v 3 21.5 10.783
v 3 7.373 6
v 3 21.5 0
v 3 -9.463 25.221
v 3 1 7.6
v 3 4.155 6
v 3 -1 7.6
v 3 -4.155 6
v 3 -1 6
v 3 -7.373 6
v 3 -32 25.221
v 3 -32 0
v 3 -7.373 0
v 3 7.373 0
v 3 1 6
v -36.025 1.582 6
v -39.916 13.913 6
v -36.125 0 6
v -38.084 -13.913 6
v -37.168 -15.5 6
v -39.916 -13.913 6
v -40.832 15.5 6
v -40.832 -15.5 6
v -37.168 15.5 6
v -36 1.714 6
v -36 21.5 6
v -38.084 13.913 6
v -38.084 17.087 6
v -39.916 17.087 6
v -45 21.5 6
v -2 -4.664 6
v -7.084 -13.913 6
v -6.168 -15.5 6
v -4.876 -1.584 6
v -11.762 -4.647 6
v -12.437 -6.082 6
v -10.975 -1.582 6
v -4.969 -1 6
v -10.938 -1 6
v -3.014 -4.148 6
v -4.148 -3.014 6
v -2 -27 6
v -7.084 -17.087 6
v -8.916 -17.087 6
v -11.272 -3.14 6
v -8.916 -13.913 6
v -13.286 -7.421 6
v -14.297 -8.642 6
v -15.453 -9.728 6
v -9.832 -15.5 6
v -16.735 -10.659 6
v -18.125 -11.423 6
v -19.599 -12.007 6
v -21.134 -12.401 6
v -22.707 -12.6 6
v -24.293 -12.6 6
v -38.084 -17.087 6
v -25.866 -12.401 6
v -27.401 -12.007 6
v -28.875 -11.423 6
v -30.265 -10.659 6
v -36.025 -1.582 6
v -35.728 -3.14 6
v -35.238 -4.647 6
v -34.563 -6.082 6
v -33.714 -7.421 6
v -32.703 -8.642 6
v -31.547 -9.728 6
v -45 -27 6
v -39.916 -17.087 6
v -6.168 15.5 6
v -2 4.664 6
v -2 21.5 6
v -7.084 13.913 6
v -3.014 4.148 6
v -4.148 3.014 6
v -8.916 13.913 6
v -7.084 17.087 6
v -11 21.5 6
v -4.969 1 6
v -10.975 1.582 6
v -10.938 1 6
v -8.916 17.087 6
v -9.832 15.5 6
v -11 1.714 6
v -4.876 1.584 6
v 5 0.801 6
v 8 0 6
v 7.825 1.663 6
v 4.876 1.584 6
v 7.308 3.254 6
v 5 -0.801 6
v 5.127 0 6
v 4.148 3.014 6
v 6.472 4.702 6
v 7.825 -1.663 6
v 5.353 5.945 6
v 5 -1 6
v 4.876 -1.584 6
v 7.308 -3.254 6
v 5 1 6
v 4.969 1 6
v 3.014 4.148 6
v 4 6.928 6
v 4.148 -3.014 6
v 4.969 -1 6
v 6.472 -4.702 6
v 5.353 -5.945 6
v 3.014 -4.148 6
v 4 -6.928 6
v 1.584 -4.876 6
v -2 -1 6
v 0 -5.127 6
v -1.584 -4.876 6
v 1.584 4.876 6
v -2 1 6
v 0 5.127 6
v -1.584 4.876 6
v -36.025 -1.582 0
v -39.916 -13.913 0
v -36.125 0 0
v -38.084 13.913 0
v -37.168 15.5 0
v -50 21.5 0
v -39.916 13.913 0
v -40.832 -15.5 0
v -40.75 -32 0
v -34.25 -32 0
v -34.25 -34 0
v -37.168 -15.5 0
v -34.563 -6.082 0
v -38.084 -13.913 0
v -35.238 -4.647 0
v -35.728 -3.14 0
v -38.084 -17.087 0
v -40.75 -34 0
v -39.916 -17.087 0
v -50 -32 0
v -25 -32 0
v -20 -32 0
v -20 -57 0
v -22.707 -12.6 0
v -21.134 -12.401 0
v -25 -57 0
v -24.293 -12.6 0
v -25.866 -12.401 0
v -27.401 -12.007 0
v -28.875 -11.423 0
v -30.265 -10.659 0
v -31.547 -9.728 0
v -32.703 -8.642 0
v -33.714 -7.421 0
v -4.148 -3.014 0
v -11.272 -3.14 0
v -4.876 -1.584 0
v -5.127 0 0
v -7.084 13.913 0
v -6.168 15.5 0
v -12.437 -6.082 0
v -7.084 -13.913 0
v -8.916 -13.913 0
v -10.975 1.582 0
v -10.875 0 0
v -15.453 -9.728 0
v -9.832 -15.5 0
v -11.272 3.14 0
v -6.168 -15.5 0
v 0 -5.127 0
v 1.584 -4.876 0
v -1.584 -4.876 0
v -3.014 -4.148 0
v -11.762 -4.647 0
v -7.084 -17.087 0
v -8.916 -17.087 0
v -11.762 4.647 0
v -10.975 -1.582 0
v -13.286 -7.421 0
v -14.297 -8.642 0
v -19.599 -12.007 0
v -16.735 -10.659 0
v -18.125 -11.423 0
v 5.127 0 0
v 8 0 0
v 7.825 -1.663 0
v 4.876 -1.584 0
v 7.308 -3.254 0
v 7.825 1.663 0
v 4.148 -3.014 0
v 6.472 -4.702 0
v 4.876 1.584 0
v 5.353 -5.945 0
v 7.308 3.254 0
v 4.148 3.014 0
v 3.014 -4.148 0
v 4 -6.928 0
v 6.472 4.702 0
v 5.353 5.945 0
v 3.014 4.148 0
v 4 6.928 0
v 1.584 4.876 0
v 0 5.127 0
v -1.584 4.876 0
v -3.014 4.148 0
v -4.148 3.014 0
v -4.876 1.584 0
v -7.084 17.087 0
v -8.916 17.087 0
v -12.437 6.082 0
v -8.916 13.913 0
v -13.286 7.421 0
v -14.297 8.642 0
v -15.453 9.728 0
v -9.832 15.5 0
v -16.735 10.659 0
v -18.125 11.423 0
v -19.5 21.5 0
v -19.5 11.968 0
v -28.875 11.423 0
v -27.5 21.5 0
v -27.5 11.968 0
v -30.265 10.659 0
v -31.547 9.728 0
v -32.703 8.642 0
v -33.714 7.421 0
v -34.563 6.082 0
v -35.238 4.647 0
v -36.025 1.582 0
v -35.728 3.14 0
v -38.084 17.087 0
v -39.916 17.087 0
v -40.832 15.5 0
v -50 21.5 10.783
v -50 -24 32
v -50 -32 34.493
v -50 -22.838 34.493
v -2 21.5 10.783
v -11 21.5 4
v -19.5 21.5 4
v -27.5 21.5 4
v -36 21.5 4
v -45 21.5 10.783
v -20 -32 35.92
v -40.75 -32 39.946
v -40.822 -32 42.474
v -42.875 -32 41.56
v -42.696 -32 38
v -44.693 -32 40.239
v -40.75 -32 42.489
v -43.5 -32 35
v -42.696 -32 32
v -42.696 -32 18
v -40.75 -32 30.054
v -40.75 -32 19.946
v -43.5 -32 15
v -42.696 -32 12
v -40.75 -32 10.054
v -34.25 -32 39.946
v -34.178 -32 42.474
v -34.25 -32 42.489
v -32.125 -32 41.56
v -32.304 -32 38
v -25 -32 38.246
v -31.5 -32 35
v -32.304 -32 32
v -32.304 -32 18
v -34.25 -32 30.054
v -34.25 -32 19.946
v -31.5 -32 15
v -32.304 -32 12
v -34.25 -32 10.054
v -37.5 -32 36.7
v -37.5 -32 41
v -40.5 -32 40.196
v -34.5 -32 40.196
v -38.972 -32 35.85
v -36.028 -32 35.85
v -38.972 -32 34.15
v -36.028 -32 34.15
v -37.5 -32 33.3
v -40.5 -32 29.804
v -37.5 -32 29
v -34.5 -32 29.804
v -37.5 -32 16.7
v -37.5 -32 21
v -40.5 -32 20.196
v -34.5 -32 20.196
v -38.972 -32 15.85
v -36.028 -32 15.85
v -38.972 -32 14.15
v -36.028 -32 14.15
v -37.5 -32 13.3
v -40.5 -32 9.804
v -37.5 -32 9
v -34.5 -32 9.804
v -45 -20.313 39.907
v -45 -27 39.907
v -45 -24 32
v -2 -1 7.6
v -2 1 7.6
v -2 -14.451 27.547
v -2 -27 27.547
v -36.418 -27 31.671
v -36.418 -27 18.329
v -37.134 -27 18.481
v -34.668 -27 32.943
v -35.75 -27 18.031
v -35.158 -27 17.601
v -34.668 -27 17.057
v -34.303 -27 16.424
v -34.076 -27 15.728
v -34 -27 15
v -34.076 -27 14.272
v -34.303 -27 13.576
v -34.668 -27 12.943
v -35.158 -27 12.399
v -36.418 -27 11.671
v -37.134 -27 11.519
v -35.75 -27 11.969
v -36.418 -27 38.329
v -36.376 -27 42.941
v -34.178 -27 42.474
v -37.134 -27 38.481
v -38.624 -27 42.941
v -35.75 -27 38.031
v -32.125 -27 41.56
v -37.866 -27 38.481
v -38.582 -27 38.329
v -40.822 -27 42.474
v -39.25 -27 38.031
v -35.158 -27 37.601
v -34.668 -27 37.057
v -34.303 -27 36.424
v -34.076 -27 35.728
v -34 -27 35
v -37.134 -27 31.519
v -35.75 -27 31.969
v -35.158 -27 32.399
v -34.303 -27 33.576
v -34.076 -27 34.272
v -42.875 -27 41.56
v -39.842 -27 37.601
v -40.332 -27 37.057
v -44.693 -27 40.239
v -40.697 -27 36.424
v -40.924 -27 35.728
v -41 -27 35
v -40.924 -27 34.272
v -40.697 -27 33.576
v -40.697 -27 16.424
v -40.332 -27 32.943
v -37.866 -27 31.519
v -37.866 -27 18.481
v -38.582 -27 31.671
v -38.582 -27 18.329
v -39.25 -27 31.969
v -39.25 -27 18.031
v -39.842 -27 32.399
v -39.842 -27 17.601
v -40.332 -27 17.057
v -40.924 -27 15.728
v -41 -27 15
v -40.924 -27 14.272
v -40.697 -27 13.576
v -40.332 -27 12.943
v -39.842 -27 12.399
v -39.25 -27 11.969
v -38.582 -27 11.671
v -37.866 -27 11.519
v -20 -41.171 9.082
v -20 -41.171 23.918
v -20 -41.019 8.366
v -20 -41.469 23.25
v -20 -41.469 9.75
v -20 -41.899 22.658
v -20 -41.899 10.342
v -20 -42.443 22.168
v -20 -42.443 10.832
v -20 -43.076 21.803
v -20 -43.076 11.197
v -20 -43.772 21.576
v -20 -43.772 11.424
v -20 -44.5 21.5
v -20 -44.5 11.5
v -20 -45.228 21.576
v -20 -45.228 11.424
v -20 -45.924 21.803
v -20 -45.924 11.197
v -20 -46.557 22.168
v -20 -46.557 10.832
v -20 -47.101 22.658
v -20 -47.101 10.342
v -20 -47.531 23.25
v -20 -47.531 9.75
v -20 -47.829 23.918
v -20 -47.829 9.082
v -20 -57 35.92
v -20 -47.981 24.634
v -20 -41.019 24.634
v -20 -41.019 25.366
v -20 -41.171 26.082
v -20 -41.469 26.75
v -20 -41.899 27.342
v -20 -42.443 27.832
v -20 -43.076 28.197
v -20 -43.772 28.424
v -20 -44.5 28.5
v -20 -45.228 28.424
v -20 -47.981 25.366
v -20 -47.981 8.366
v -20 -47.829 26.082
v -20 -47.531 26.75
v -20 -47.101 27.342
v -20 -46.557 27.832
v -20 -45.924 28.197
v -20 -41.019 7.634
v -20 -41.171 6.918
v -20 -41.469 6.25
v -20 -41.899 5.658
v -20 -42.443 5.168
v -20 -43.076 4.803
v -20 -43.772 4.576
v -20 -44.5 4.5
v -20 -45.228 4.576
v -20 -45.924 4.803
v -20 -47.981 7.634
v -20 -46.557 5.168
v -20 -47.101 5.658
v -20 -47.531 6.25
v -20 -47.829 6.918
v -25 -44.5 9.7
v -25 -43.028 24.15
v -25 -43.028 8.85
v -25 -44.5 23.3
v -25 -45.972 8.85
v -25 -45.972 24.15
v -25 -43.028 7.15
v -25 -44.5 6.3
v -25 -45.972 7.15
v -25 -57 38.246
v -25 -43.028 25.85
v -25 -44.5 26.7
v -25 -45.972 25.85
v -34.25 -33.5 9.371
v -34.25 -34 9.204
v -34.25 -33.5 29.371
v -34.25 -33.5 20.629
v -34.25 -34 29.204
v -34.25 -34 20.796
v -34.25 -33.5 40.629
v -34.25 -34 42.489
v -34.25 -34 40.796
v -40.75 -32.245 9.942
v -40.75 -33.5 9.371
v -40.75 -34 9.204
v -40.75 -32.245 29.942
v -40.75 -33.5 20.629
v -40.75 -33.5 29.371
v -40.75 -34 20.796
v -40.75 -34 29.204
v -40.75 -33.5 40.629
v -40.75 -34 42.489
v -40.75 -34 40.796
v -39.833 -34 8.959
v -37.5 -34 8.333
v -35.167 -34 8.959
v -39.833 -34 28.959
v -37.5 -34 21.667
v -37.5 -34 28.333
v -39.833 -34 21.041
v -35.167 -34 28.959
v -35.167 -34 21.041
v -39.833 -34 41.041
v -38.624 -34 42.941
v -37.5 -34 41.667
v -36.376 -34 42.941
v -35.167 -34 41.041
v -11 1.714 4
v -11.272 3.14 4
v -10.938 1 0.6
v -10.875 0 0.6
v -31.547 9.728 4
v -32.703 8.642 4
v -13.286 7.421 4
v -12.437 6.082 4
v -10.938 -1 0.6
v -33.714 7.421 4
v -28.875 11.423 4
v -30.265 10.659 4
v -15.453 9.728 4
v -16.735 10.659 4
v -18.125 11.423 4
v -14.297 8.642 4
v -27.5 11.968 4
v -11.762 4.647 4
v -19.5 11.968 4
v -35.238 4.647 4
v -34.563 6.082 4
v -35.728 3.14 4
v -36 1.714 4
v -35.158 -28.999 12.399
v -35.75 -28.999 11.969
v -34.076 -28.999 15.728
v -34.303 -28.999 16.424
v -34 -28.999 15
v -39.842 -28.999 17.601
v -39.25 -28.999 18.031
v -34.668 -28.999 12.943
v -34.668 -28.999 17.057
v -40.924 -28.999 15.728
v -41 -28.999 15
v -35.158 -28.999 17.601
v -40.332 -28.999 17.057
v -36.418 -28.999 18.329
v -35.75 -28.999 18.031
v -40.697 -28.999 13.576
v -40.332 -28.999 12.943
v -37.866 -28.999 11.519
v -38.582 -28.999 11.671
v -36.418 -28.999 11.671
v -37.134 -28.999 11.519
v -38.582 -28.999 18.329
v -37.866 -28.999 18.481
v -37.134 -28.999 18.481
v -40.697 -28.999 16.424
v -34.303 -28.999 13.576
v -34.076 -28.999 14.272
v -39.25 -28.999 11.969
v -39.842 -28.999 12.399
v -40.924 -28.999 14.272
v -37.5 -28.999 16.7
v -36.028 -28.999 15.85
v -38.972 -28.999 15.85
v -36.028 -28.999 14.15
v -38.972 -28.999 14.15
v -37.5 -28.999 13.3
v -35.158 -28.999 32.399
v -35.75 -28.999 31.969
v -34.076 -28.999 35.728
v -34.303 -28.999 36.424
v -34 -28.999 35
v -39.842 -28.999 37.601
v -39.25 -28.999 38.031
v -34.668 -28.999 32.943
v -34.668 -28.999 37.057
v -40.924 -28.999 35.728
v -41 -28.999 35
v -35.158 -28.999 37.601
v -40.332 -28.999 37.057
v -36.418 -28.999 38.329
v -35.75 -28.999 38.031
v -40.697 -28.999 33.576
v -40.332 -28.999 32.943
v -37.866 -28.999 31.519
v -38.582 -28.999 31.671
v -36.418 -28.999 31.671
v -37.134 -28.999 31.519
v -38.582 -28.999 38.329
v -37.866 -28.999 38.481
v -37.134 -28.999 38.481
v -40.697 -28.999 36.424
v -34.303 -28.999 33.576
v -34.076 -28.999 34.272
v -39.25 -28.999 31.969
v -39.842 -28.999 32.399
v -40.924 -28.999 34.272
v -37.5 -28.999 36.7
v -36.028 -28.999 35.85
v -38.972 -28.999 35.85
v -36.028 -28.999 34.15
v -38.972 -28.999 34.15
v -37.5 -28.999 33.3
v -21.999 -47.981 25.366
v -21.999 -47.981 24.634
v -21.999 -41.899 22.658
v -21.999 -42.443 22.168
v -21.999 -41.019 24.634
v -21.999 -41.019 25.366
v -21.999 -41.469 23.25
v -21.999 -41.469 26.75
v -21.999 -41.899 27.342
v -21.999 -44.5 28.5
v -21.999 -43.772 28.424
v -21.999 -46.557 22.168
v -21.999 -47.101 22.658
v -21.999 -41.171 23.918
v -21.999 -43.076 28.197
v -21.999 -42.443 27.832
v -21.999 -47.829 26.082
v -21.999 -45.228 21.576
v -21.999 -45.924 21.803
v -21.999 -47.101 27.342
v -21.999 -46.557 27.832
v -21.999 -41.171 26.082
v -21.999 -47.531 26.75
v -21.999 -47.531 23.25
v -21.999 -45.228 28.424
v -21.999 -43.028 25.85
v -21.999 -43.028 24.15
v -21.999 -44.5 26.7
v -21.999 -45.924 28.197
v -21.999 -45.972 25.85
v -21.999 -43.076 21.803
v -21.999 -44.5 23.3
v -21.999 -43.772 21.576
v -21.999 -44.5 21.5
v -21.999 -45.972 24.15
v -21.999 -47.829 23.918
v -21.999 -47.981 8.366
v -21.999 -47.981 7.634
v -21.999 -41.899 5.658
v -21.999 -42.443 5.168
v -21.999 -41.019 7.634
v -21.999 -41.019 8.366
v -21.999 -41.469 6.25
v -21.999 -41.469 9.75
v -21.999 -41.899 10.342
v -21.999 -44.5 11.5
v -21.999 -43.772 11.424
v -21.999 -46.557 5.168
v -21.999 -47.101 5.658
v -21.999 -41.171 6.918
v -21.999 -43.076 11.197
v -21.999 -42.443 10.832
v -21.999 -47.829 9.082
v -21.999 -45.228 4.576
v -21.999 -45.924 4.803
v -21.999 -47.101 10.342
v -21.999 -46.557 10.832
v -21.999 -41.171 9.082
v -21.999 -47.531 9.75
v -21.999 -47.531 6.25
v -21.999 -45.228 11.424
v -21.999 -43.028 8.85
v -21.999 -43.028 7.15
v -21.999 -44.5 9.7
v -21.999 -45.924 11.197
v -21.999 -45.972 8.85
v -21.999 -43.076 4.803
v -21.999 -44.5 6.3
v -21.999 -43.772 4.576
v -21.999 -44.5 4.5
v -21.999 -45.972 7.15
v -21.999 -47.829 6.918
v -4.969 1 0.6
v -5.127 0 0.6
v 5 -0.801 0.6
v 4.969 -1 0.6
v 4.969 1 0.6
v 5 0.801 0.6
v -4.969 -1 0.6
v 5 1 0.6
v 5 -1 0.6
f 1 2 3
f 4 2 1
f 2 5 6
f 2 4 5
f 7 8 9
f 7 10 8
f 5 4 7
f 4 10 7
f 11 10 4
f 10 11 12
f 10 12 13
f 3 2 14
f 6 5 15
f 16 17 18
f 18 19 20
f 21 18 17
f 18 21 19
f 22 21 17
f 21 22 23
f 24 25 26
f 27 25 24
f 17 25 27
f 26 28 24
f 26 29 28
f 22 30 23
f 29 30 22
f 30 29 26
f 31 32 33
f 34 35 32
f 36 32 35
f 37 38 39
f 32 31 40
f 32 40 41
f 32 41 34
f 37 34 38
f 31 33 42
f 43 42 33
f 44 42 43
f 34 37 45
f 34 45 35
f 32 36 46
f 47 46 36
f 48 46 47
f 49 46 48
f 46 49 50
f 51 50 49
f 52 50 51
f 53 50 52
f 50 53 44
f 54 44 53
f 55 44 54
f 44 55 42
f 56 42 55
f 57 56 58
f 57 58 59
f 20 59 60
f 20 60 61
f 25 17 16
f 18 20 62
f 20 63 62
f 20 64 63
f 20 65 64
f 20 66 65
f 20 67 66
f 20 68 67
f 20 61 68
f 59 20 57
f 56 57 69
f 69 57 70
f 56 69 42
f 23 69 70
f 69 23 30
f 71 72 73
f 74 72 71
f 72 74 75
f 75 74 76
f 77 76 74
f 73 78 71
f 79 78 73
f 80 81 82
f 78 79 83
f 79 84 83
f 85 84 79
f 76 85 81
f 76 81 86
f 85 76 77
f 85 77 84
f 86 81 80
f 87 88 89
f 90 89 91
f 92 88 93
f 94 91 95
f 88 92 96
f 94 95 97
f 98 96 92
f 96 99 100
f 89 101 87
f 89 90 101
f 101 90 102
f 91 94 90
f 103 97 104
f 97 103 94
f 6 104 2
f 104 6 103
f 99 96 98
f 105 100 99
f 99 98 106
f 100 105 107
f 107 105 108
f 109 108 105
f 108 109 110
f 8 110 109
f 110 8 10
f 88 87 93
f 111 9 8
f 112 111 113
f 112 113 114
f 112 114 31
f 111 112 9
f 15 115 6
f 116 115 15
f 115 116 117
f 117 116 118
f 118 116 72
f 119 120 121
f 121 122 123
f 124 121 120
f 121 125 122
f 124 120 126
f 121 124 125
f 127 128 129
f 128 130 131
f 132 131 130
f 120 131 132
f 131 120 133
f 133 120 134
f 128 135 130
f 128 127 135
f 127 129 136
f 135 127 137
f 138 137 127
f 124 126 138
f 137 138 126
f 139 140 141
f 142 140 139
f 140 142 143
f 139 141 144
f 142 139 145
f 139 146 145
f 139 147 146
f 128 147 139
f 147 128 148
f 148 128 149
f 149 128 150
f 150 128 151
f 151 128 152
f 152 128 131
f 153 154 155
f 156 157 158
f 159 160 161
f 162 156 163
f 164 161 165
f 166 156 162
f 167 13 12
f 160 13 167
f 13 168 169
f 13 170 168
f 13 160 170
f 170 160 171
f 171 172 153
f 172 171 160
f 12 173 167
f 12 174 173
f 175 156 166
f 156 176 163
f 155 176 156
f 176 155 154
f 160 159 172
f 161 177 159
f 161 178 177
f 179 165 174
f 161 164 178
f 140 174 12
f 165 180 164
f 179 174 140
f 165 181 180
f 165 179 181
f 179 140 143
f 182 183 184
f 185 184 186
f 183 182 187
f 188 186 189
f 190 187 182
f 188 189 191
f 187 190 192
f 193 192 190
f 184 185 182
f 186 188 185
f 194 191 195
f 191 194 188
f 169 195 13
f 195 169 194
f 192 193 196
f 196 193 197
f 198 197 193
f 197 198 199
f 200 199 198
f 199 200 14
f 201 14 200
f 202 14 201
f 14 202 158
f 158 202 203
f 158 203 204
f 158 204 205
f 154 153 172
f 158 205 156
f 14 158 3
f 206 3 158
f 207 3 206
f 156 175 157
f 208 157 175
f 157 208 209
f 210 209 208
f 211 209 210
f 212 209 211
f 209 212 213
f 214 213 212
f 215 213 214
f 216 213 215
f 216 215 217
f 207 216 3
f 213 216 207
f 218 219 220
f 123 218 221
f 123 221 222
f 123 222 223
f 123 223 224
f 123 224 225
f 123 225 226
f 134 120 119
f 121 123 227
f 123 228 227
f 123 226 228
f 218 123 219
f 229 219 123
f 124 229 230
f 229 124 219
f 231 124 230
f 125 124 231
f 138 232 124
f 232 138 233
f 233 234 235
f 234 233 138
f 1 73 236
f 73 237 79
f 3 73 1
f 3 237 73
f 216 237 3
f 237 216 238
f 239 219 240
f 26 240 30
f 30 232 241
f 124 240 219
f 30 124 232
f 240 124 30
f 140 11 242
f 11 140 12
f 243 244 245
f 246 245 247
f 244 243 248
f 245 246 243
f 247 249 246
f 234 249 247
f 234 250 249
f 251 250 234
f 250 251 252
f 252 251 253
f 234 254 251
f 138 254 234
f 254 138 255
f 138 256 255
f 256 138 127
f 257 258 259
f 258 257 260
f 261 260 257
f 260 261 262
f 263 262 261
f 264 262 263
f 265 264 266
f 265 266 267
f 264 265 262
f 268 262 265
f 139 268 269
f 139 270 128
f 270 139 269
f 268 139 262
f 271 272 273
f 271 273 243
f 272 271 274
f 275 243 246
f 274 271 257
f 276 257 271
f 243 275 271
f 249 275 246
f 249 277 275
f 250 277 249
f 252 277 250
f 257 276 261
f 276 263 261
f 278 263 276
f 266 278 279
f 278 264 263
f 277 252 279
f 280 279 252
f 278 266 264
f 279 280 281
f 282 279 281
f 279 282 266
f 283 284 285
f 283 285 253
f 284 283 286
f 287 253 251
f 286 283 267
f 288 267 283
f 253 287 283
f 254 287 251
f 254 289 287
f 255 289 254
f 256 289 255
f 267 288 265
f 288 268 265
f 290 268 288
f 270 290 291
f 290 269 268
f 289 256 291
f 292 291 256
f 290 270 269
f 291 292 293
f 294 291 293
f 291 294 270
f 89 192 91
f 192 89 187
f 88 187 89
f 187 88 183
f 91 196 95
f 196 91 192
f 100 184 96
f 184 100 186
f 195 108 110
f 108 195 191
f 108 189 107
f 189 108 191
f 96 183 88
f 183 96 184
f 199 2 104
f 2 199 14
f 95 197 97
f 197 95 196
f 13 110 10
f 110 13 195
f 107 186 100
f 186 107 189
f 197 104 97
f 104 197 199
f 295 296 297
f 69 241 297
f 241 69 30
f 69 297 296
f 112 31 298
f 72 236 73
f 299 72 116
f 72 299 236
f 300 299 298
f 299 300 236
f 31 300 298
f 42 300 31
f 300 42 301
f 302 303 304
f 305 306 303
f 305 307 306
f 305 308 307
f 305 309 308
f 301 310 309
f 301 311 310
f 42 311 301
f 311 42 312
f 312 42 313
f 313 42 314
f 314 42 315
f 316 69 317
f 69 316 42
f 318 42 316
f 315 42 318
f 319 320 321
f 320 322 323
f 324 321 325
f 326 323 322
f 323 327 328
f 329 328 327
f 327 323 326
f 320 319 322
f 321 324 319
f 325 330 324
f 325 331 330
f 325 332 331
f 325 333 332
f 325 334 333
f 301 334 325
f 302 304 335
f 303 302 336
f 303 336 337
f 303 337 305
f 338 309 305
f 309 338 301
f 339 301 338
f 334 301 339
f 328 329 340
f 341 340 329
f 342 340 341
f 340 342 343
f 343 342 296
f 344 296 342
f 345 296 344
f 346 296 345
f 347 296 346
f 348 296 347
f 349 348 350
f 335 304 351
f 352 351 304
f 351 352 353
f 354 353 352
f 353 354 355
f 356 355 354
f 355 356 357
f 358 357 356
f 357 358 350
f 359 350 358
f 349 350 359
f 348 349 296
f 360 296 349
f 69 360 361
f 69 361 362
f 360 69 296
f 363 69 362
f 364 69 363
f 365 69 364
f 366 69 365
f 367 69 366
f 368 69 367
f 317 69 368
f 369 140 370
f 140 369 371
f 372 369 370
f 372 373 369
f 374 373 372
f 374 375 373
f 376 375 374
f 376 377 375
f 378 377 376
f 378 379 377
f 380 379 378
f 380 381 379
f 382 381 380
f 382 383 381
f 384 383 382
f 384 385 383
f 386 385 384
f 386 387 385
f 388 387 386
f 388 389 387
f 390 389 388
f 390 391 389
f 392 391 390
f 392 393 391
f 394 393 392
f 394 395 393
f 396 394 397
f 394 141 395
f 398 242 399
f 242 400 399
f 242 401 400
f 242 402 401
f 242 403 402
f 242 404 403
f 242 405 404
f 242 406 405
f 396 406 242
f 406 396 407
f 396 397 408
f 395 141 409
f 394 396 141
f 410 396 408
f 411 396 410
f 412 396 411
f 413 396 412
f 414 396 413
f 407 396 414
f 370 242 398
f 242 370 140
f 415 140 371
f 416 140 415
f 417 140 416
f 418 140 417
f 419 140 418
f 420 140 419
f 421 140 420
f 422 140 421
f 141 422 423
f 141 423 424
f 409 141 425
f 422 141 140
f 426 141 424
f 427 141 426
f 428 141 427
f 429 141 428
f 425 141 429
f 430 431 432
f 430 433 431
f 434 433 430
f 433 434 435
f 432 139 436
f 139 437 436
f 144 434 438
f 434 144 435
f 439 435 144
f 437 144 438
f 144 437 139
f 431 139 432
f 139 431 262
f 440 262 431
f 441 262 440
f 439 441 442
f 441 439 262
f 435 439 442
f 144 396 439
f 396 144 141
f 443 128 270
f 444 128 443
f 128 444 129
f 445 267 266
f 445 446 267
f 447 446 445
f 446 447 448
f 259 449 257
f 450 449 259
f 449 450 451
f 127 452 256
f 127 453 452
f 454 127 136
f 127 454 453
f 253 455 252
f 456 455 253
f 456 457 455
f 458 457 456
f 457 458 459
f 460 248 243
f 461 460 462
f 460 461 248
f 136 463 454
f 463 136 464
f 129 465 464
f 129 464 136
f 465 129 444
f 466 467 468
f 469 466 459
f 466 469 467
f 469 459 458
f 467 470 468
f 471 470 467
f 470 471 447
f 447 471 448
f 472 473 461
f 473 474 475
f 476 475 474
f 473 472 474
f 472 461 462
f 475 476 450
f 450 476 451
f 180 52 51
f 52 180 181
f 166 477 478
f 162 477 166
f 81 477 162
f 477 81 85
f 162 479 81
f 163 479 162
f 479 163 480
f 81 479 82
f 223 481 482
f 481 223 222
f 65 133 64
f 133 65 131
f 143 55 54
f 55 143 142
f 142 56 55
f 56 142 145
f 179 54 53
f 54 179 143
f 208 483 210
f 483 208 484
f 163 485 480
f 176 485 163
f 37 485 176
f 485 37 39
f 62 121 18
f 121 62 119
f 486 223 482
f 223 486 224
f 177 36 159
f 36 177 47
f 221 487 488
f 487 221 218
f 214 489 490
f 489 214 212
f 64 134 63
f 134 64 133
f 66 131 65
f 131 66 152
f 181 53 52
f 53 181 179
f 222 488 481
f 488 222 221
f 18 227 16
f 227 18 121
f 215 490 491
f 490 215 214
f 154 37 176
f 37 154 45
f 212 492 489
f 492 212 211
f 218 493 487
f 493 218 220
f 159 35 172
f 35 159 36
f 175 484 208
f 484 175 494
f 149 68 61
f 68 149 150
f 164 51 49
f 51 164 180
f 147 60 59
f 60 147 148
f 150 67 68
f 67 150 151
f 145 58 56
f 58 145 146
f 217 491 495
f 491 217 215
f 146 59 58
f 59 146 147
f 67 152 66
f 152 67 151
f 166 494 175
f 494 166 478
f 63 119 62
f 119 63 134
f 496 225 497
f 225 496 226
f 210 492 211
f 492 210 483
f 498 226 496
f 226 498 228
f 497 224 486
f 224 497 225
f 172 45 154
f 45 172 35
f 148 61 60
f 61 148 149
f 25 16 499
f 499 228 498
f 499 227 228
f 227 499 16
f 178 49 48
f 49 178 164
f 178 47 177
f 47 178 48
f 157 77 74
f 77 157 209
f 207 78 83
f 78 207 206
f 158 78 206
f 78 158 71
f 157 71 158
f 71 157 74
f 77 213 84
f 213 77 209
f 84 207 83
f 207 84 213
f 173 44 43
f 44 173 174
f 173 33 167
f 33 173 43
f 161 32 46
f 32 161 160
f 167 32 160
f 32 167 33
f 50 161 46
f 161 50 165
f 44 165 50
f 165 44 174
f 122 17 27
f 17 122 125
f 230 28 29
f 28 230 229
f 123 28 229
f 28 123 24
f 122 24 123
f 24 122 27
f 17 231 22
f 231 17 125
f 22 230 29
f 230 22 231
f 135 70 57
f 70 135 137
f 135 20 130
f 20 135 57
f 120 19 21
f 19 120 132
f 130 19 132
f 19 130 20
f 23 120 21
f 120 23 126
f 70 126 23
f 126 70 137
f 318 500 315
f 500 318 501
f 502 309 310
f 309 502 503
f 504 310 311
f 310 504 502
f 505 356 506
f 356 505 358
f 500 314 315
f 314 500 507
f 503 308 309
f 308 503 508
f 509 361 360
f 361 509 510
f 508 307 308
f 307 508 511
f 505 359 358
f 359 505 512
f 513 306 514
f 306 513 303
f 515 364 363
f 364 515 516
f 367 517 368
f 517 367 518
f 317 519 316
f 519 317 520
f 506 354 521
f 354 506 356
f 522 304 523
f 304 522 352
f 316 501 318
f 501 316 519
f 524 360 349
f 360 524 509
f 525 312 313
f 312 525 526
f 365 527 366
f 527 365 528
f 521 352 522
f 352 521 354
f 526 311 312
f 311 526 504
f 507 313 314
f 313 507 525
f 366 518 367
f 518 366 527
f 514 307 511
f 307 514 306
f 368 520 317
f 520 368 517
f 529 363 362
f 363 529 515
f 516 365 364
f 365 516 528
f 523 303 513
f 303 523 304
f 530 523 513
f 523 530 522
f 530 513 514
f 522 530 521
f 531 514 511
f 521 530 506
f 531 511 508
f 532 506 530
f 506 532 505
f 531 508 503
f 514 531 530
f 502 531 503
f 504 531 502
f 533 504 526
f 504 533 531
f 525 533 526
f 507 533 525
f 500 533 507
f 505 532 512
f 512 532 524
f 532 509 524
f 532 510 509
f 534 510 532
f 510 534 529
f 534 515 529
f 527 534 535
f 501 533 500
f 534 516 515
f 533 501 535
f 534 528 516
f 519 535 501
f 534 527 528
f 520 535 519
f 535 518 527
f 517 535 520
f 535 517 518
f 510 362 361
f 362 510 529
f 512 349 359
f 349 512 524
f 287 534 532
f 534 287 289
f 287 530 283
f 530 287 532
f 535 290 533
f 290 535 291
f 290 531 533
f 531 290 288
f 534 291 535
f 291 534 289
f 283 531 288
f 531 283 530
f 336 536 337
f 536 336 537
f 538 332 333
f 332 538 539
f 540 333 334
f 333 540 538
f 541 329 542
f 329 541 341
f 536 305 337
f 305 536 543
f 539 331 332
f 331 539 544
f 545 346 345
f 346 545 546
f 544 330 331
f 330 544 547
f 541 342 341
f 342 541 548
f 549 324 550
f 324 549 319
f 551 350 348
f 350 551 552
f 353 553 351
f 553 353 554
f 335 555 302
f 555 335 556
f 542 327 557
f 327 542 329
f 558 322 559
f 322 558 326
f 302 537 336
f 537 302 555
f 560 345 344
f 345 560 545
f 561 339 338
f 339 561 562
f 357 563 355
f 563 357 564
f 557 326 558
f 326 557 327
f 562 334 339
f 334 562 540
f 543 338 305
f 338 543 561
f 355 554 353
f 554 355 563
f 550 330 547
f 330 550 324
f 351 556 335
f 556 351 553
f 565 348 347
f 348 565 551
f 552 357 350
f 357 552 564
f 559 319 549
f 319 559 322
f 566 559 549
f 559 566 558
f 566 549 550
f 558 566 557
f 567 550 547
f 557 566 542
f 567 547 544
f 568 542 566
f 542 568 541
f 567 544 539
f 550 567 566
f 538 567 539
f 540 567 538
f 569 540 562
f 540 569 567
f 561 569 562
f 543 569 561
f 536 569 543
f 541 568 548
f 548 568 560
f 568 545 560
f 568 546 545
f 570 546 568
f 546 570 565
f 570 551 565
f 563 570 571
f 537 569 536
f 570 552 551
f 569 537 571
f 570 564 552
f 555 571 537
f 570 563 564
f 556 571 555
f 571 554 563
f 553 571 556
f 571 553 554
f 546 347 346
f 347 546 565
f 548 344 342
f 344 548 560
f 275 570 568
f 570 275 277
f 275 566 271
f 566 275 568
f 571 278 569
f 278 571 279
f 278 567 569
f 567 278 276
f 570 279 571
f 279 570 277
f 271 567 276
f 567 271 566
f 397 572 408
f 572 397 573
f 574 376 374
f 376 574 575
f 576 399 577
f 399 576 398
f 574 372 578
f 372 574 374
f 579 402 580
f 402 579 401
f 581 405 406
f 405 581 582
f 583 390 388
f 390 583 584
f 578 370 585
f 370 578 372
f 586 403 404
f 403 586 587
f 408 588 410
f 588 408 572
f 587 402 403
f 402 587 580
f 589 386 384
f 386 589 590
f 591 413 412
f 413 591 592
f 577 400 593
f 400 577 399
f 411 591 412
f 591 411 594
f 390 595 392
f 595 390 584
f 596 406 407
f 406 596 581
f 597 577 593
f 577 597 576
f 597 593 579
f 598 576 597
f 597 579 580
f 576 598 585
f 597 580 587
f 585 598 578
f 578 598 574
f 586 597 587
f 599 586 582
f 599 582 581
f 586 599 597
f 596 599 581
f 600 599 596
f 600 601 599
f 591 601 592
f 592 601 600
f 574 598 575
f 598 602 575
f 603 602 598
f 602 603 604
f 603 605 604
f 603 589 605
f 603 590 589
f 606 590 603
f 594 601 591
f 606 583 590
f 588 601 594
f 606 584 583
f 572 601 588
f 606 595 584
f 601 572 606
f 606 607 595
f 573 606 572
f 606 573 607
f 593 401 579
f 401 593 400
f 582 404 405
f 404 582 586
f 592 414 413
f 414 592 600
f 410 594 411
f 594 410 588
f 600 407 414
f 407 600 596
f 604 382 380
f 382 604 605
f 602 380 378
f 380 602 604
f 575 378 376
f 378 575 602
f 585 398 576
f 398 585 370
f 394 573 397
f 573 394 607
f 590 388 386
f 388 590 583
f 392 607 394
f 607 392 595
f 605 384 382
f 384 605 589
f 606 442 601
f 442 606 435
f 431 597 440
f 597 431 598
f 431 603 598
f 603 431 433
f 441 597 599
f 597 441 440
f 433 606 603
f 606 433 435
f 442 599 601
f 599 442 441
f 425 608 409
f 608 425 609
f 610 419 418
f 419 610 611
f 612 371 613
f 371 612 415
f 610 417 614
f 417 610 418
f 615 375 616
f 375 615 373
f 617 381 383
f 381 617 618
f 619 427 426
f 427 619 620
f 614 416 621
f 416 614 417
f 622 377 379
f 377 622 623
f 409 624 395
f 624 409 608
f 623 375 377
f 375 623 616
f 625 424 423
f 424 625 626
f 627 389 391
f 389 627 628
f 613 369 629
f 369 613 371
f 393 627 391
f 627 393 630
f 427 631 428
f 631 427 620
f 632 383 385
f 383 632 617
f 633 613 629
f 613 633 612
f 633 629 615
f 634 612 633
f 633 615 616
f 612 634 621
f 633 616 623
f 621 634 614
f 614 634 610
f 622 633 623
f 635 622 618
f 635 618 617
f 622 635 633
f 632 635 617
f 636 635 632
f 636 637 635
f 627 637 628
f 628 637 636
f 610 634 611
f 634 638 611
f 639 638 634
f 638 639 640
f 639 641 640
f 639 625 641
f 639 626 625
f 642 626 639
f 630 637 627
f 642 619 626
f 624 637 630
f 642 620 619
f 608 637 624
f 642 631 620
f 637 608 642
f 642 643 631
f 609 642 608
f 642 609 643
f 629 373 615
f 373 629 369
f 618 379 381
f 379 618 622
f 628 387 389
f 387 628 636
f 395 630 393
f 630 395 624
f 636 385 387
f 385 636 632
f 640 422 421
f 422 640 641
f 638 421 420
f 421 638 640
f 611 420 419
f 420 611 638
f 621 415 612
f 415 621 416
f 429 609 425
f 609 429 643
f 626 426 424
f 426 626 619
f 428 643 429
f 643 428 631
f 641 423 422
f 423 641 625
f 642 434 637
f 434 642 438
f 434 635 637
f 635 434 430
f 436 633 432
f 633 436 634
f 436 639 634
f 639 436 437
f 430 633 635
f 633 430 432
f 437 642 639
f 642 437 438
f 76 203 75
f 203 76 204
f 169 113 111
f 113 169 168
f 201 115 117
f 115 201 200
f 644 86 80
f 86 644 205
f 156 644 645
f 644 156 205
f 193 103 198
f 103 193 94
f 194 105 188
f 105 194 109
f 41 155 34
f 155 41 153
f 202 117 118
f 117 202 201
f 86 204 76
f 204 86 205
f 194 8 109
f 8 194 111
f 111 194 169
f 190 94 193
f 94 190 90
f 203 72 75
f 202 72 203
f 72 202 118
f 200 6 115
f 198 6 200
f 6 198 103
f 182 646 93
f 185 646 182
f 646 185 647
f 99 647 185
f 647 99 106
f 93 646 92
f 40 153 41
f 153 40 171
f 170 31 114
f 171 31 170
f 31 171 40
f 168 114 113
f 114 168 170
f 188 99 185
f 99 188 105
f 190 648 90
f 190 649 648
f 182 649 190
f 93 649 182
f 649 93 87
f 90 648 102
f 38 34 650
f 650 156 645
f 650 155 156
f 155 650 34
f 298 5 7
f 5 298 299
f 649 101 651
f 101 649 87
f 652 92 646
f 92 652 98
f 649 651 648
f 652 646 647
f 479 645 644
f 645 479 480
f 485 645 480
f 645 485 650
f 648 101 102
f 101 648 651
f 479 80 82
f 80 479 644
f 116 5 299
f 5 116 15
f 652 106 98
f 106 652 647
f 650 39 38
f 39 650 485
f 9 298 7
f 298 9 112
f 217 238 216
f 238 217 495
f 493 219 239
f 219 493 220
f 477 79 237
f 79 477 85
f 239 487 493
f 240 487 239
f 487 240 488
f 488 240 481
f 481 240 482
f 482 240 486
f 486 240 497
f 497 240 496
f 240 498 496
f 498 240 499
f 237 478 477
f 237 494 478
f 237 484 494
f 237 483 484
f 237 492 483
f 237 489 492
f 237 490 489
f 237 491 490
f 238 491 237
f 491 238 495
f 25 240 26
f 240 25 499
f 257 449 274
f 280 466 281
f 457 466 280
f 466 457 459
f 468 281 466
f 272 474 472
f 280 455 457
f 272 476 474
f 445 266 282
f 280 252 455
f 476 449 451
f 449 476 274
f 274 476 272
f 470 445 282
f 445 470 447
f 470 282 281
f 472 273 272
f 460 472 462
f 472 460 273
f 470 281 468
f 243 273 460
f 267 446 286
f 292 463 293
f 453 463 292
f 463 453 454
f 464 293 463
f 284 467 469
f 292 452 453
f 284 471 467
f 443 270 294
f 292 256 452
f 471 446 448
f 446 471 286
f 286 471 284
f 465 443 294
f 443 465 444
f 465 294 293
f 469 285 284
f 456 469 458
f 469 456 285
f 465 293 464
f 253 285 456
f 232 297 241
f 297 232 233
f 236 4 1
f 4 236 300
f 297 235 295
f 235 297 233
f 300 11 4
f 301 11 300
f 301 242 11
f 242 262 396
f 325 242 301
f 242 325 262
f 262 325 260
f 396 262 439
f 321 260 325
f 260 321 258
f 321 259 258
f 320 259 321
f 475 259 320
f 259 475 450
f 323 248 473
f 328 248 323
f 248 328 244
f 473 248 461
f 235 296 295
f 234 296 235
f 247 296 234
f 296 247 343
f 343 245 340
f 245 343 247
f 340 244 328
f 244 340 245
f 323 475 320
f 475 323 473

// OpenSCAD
// file: common_dimensions.scad
x_rod_distance = 45;

thinwall = 3;

belt_width = 6;
belt_thickness = 1.5;

// Account for idler bearing and stepper pinion being different diameters
x_stepper_pinion_od = 12.0;
x_idler_bearing_od = 9.8; // 608 bearing
x_idler_bearing_id = 3.0; // 608 bearing
x_idler_bearing_width = 8.5; // 608 bearing
x_idler_to_stepper_offset = (x_stepper_pinion_od-x_idler_bearing_od)/2; 


// T8 NUT dimensions
t8nut_od = 22.0;
t8nut_id = 10.25; // 10.25; // 10.25 actual, 12.0 for spring on anti-backlash nut
t8nut_id_clearance = 14.0 + 3; // 
//t8nut_id = 10.2; //10.2 actual

// Z rod/bearing dimensions
z_rod_diam = 10.0; 
z_rod_diam_tight = z_rod_diam - 0.07; // Adjust diam based on test prints
z_bearing_diam = 19.0; // LM10UU
z_bearing_length = 29.0; // LM10UU

// X rod/bearing dimensions
x_rod_diam = 10.0; 
x_rod_diam_tight = x_rod_diam - 0.07; // Adjust tightness based on test prints
x_bearing_diam = 19.0; // LM10UU
x_bearing_length = 29.0; // LM10UU

z_bottom_wall_width = 5;
z_bottom_width = 43 + 2*z_bottom_wall_width;
z_bottom_height = 43;

z_top_wall_width = 5;
z_top_width = 30;
z_top_height = 22;
z_top_generate_rod_holder = false; // Optionally generate a Z rod holder, which limits the length of the Z rod, or no holder, which allows a longer Z rod to be used.

// Outer diam of Z bearing holders in X base.  

//z_bearing_size = z_bearing_diam + 2 * thinwall; // For discrete bearings, include wall to hold bearings
z_bearing_size = z_bearing_diam; // For PTFE bearings, don't need supportive walls

// Clearance required Z leadscrew to avoid interference.  Potential interference from leadscrew nut, 
// leadscrew anti-backlash spring/nut, motor/leadscrew coupler, etc.
z_leadscrew_clearance = 25+3; // Leadscrew coupler is 25mm

z_motor_ofs = z_bearing_size/2 + z_leadscrew_clearance/2; //17; // Z-motor offset from Z-rod (center-to-center) - both are aligned with X axis


x_end_belt_hole_height = x_rod_distance-x_rod_diam-2*thinwall; //31-5; // To fit between NEMA17 mounting screws
x_end_belt_hole_width = x_idler_bearing_width+0.5; // x_end_base_depth-2*thinwall; // 10;
x_end_base_height = x_rod_distance + x_rod_diam + 2*thinwall; //58 + 10;
x_end_base_depth = x_end_belt_hole_width + 2*thinwall; //18; //17; // NOTE: Manually adjust to prevent X rod cutout interference with Z linear bearing cutouts
x_end_base_width = z_bearing_size + z_leadscrew_clearance/2;
x_end_idler_open_end = true; // Specify whether x-idler end has closed ends with tension screws, or straight rod cutouts to allow longer rods.

z_rod_to_base = z_leadscrew_clearance/2; // Z-rod center offset from x-end front face
z_rod_to_rail = z_rod_to_base + x_end_base_depth + 3; // Z-rod center (and X-axis) offset from 3030 rail front face - dictated by NEMA17 stepper center (44mm / side)
z_beam_motor_ofs = 43+1-z_bottom_wall_width-25; // Z-rod center offset from Z beam center

x_to_z_offset = x_end_base_depth/2+z_rod_to_base; // 15; // Used to offset the X pushrods/belt from the Z rod.


y_rod_diam = 10.0;
y_rod_diam_tight = y_rod_diam - 0.0; // Adjust tightness based on test prints
y_rod_to_rail = 2*thinwall + y_rod_diam/2; // y rod center to 3030 rail.  11+4 from Haribo holder with 8mm rod. Use 2x thinwall to give room for ziptie hole.
y_rod_screw_diam = 3.0;

// 16T gt2 bearing
y_idler_bearing_od = 9.8; 
y_idler_bearing_id = 3.0; 
y_idler_bearing_width = 8.5; 

// Dimensions of the Y beltholder component (the sliding piece)
y_beltholder_width = 18;
y_beltholder_height = 2 + 9 + 2;
y_beltholder_depth = 6 + 2;

// Dimensions of the Y beltholder base component (that mounts to the plate)
y_beltholder_base_height = 9 + y_beltholder_height + 2;
y_beltholder_base_width = 2*y_beltholder_width + 10;
y_beltholder_base_depth = y_beltholder_depth + 8;

y_belt_to_plate = 9 + y_beltholder_height/2;
y_idler_to_plate = y_belt_to_plate + y_idler_bearing_od/2;

//y_plate_to_belt = 2*thinwall; // Bottom of plate to top of belt

y_bearing_od = 19.0; // LM10uu
y_bearing_length = 29.0; // LM10uu

y_bearing_holder_width = 50;
y_bearing_holder_depth = y_bearing_length;
y_bearing_holder_rod_ofs = thinwall*2 + y_bearing_od/2; // Offset from Y rod to mounting plate.  Use 2x thinwall to give room for ziptie hole.
y_bearing_holder_height = y_bearing_holder_rod_ofs+y_bearing_od*0.25;

y_rail_to_plate = y_rod_to_rail + y_bearing_holder_rod_ofs; // Offset from top of 3030 rail to bottom of mounting plate
y_rail_to_idler = y_rail_to_plate - y_idler_to_plate; // Offset from top of 3030 rail to center of idler (and stepper)

z_beam_width = 25;
z_railguide_width = 6.5; //8.30; // 3030
z_railguide_depth = 2.0;
z_railguide_keepout = 12; // 3030 dropin nut is 11, plus margin

x_beam_width = 25;
x_railguide_width = 6.5; //8.30; // 3030
x_railguide_depth = 2.0;
x_railguide_keepout = 12; // 3030 dropin nut is 11, plus margin
// file: polyholes.scad
//Original Prusa

//
// Mendel90
//
// GNU GPL v2
// nop.head@gmail.com
// hydraraptor.blogspot.com
//
// See http://hydraraptor.blogspot.com/2011/02/polyholes.html
//
function sides(r) = max(round(4 *r),3);
function correctedRadius(r,n) = 0.1 + r / cos(180 / n);
function correctedDiameter(d) = 0.2 + d / cos(180 / sides(d / 2));

module polyCircle(r, center = false) {
    n = sides(r);
    circle(r = correctedRadius(r,n), $fn = n, center = center);
}

module poly_circle(r, center = false) {
	polyCircle(r, center);
}

module polyCylinder(r, h, center = false) {
    n = sides(r);
    cylinder(h = h, r = correctedRadius(r,n), $fn = n, center = center);
}

module poly_cylinder(r, h, center = false) {
	polyCylinder(r,h,center);
}

module polydCylinder(r, center = false) {
    n = sides(r);
    r = correctedRadius(r,n);
    cylinder(h = h, r = r, $fn = n, center = center);
    translate([0, -r, 0])
        cube([r, 2 * r, h]);
}

module poly_d_cylinder(r, center = false) {
	polydCylinder(r,center);
}
// main file
// PRUSA iteration3
// Z axis bottom holder
// GNU GPL v3
// Josef Průša <iam@josefprusa.cz> and contributors
// http://www.reprap.org/wiki/Prusa_Mendel
// http://prusamendel.org

use <polyholes.scad>
include <common_dimensions.scad>

z_bottom_depth = z_rod_to_rail+43/2;

module z_bottom_base(){
    translate([-z_bottom_width/2-z_motor_ofs,-z_rod_to_rail,0]) cube([z_bottom_width,z_bottom_depth,6]); // Base
    cylinder(d=z_rod_diam+2*thinwall, h=6, $fn=30);
    translate([-z_bottom_width/2-z_motor_ofs,-z_rod_to_rail,0]) cube([z_bottom_wall_width,z_bottom_depth,z_bottom_height]); // Motor-side wall
    translate([-z_bottom_width/2-z_motor_ofs+z_bottom_width-z_bottom_wall_width,-z_rod_to_rail,0]) cube([z_bottom_wall_width,z_bottom_depth,z_bottom_height]); // Rod-side wall
    translate([-z_bottom_width/2-z_motor_ofs,-z_rod_to_rail,0]) cube([z_bottom_width,z_bottom_wall_width,z_bottom_height]); // Base
    
    // Wraparound wall
    translate([-z_motor_ofs-z_beam_motor_ofs+z_beam_width/2,-z_rod_to_rail-z_beam_width,0]) cube([z_bottom_wall_width,z_beam_width,z_bottom_height]);
    
    // Rail guide
    translate([-z_railguide_width/2-z_motor_ofs-z_beam_motor_ofs,-z_railguide_depth-z_rod_to_rail,0]) cube([z_railguide_width,z_railguide_depth,z_bottom_height]);
    
    
    %translate([-z_motor_ofs-z_beam_motor_ofs-z_beam_width/2,-z_rod_to_rail-z_beam_width,0]) cube([z_beam_width,z_beam_width,z_bottom_height]);
}

module z_bottom_fancy(){
    hull() {
        translate([-z_motor_ofs-z_bottom_width/2-12,-100,0]) cube([z_bottom_width+20, 200, z_bottom_height/2]);
        translate([-z_motor_ofs-z_beam_motor_ofs,0,z_bottom_height*0.75]) rotate([90,0,0]) cylinder(d=z_bottom_height/2, h=200, center=true);
    }
}

module z_bottom_holes(){

    // Z rod holder
    translate([0,0,5+1]) rotate([0,180,0]) poly_cylinder(h = 50, r=z_rod_diam_tight/2);
    translate([z_rod_diam/2,1,0.6]) rotate([0,0,180]) cube([z_rod_diam+z_motor_ofs,2,7]); // it's bit up because it helps with printing
    
    // Cutout to allow sliding stepper in while z-axis is mounted to rail.
    translate([-8/2-z_motor_ofs,0,-1]) cube([8,100,20]);
    
    translate([-z_motor_ofs-12.5,0,6-2]) cube([25,100,100]);
    
    translate([-z_motor_ofs,0,-1]) stepper_motor_holes();    

    // Frame mounting screw holes
    //translate([-z_motor_ofs-z_beam_motor_ofs,0,10+20+5]) rotate([90,30,0]) cylinder(h = 50, r=1.6, $fn=6);
    //translate([-z_motor_ofs-z_beam_motor_ofs,0,10+ 0+5]) rotate([90,30,0]) cylinder(h = 50, r=1.6, $fn=6);

    // Frame mounting screw head holes (1.5mm recess)
    //translate([-z_motor_ofs-z_beam_motor_ofs,-z_rod_to_rail+z_bottom_wall_width-1.5,10+20+5]) rotate([-90,0,0]) cylinder(h = 50, r=3.5, $fn=30);
    //translate([-z_motor_ofs-z_beam_motor_ofs,-z_rod_to_rail+z_bottom_wall_width-1.5,10+ 0+5]) rotate([-90,0,0]) cylinder(h = 50, r=3.5, $fn=30);
    for (h=[15,35]) {
        translate([-z_motor_ofs-z_beam_motor_ofs,-z_rod_to_rail+z_bottom_wall_width+0.001,h]) rotate([90,0,0])  cylinder(h = 2, r=3.5, $fn=30);
        translate([-z_motor_ofs-z_beam_motor_ofs,-z_rod_to_rail+z_bottom_wall_width+0.001,h]) rotate([0,-90,90]) cylinder(h = 50, r=1.7, $fn=6);
    }

    // Rail guide nut cutouts
    translate([-z_motor_ofs-z_beam_motor_ofs,-3-z_rod_to_rail,10+20+5]) rotate([-90,0,0]) cylinder(h = 3, d1=z_railguide_keepout+2, d2=z_railguide_keepout, $fn=12);
    translate([-z_motor_ofs-z_beam_motor_ofs,-3-z_rod_to_rail,10+ 0+5]) rotate([-90,0,0]) cylinder(h = 3, d1=z_railguide_keepout+2, d2=z_railguide_keepout, $fn=12);

    // Wraparound wall mounting holes
    //for (h=[25,8]) translate([-z_motor_ofs-z_beam_motor_ofs+z_beam_width/2,-z_rod_to_rail-z_beam_width/2,h]) rotate([0,90,0]) cylinder(h=50, d=3.2, center=true, $fn=6);
    // Wraparound mounting screw holes
    for (h=[25,8]) {
        translate([-z_motor_ofs-z_beam_motor_ofs+z_beam_width/2+z_top_wall_width+0.001,-z_rod_to_rail-z_beam_width/2,h]) rotate([0,-90,0]) cylinder(h = 2, r=3.5, $fn=30);
        translate([-z_motor_ofs-z_beam_motor_ofs+z_beam_width/2+z_top_wall_width+0.001,-z_rod_to_rail-z_beam_width/2,h]) rotate([0,-90,0]) cylinder(h = 20, r=1.7, $fn=6);
    }

    // Fancy angled side wall reduction
    translate([-50-z_motor_ofs,-50+26,32]) rotate([-25,0,0]) cube([100, 100, 100]);    
}

module z_bottom_right(){
    intersection() {
        difference(){
            z_bottom_base();
            z_bottom_holes();
        }
        z_bottom_fancy();
    }
    %translate([-43/2-z_motor_ofs,-43/2,7]) color("red",0.25) cube([43,43,50]);

}

module z_bottom_left(){
 translate([z_rod_diam+z_bottom_wall_width*2,0,0]) mirror([1,0,0]) 
    z_bottom_right();
}

module stepper_motor_holes() {
    poly_cylinder( r=12.5, h=100);
    translate([+15.5,+15.5,0]) poly_cylinder( r=3.0/2, h=100 );
    translate([+15.5,-15.5,0]) poly_cylinder( r=3.0/2, h=100 );
    translate([-15.5,+15.5,0]) poly_cylinder( r=3.0/2, h=100 );
    translate([-15.5,-15.5,0]) poly_cylinder( r=3.0/2, h=100 );
}

z_bottom_right();
//z_bottom_left();
